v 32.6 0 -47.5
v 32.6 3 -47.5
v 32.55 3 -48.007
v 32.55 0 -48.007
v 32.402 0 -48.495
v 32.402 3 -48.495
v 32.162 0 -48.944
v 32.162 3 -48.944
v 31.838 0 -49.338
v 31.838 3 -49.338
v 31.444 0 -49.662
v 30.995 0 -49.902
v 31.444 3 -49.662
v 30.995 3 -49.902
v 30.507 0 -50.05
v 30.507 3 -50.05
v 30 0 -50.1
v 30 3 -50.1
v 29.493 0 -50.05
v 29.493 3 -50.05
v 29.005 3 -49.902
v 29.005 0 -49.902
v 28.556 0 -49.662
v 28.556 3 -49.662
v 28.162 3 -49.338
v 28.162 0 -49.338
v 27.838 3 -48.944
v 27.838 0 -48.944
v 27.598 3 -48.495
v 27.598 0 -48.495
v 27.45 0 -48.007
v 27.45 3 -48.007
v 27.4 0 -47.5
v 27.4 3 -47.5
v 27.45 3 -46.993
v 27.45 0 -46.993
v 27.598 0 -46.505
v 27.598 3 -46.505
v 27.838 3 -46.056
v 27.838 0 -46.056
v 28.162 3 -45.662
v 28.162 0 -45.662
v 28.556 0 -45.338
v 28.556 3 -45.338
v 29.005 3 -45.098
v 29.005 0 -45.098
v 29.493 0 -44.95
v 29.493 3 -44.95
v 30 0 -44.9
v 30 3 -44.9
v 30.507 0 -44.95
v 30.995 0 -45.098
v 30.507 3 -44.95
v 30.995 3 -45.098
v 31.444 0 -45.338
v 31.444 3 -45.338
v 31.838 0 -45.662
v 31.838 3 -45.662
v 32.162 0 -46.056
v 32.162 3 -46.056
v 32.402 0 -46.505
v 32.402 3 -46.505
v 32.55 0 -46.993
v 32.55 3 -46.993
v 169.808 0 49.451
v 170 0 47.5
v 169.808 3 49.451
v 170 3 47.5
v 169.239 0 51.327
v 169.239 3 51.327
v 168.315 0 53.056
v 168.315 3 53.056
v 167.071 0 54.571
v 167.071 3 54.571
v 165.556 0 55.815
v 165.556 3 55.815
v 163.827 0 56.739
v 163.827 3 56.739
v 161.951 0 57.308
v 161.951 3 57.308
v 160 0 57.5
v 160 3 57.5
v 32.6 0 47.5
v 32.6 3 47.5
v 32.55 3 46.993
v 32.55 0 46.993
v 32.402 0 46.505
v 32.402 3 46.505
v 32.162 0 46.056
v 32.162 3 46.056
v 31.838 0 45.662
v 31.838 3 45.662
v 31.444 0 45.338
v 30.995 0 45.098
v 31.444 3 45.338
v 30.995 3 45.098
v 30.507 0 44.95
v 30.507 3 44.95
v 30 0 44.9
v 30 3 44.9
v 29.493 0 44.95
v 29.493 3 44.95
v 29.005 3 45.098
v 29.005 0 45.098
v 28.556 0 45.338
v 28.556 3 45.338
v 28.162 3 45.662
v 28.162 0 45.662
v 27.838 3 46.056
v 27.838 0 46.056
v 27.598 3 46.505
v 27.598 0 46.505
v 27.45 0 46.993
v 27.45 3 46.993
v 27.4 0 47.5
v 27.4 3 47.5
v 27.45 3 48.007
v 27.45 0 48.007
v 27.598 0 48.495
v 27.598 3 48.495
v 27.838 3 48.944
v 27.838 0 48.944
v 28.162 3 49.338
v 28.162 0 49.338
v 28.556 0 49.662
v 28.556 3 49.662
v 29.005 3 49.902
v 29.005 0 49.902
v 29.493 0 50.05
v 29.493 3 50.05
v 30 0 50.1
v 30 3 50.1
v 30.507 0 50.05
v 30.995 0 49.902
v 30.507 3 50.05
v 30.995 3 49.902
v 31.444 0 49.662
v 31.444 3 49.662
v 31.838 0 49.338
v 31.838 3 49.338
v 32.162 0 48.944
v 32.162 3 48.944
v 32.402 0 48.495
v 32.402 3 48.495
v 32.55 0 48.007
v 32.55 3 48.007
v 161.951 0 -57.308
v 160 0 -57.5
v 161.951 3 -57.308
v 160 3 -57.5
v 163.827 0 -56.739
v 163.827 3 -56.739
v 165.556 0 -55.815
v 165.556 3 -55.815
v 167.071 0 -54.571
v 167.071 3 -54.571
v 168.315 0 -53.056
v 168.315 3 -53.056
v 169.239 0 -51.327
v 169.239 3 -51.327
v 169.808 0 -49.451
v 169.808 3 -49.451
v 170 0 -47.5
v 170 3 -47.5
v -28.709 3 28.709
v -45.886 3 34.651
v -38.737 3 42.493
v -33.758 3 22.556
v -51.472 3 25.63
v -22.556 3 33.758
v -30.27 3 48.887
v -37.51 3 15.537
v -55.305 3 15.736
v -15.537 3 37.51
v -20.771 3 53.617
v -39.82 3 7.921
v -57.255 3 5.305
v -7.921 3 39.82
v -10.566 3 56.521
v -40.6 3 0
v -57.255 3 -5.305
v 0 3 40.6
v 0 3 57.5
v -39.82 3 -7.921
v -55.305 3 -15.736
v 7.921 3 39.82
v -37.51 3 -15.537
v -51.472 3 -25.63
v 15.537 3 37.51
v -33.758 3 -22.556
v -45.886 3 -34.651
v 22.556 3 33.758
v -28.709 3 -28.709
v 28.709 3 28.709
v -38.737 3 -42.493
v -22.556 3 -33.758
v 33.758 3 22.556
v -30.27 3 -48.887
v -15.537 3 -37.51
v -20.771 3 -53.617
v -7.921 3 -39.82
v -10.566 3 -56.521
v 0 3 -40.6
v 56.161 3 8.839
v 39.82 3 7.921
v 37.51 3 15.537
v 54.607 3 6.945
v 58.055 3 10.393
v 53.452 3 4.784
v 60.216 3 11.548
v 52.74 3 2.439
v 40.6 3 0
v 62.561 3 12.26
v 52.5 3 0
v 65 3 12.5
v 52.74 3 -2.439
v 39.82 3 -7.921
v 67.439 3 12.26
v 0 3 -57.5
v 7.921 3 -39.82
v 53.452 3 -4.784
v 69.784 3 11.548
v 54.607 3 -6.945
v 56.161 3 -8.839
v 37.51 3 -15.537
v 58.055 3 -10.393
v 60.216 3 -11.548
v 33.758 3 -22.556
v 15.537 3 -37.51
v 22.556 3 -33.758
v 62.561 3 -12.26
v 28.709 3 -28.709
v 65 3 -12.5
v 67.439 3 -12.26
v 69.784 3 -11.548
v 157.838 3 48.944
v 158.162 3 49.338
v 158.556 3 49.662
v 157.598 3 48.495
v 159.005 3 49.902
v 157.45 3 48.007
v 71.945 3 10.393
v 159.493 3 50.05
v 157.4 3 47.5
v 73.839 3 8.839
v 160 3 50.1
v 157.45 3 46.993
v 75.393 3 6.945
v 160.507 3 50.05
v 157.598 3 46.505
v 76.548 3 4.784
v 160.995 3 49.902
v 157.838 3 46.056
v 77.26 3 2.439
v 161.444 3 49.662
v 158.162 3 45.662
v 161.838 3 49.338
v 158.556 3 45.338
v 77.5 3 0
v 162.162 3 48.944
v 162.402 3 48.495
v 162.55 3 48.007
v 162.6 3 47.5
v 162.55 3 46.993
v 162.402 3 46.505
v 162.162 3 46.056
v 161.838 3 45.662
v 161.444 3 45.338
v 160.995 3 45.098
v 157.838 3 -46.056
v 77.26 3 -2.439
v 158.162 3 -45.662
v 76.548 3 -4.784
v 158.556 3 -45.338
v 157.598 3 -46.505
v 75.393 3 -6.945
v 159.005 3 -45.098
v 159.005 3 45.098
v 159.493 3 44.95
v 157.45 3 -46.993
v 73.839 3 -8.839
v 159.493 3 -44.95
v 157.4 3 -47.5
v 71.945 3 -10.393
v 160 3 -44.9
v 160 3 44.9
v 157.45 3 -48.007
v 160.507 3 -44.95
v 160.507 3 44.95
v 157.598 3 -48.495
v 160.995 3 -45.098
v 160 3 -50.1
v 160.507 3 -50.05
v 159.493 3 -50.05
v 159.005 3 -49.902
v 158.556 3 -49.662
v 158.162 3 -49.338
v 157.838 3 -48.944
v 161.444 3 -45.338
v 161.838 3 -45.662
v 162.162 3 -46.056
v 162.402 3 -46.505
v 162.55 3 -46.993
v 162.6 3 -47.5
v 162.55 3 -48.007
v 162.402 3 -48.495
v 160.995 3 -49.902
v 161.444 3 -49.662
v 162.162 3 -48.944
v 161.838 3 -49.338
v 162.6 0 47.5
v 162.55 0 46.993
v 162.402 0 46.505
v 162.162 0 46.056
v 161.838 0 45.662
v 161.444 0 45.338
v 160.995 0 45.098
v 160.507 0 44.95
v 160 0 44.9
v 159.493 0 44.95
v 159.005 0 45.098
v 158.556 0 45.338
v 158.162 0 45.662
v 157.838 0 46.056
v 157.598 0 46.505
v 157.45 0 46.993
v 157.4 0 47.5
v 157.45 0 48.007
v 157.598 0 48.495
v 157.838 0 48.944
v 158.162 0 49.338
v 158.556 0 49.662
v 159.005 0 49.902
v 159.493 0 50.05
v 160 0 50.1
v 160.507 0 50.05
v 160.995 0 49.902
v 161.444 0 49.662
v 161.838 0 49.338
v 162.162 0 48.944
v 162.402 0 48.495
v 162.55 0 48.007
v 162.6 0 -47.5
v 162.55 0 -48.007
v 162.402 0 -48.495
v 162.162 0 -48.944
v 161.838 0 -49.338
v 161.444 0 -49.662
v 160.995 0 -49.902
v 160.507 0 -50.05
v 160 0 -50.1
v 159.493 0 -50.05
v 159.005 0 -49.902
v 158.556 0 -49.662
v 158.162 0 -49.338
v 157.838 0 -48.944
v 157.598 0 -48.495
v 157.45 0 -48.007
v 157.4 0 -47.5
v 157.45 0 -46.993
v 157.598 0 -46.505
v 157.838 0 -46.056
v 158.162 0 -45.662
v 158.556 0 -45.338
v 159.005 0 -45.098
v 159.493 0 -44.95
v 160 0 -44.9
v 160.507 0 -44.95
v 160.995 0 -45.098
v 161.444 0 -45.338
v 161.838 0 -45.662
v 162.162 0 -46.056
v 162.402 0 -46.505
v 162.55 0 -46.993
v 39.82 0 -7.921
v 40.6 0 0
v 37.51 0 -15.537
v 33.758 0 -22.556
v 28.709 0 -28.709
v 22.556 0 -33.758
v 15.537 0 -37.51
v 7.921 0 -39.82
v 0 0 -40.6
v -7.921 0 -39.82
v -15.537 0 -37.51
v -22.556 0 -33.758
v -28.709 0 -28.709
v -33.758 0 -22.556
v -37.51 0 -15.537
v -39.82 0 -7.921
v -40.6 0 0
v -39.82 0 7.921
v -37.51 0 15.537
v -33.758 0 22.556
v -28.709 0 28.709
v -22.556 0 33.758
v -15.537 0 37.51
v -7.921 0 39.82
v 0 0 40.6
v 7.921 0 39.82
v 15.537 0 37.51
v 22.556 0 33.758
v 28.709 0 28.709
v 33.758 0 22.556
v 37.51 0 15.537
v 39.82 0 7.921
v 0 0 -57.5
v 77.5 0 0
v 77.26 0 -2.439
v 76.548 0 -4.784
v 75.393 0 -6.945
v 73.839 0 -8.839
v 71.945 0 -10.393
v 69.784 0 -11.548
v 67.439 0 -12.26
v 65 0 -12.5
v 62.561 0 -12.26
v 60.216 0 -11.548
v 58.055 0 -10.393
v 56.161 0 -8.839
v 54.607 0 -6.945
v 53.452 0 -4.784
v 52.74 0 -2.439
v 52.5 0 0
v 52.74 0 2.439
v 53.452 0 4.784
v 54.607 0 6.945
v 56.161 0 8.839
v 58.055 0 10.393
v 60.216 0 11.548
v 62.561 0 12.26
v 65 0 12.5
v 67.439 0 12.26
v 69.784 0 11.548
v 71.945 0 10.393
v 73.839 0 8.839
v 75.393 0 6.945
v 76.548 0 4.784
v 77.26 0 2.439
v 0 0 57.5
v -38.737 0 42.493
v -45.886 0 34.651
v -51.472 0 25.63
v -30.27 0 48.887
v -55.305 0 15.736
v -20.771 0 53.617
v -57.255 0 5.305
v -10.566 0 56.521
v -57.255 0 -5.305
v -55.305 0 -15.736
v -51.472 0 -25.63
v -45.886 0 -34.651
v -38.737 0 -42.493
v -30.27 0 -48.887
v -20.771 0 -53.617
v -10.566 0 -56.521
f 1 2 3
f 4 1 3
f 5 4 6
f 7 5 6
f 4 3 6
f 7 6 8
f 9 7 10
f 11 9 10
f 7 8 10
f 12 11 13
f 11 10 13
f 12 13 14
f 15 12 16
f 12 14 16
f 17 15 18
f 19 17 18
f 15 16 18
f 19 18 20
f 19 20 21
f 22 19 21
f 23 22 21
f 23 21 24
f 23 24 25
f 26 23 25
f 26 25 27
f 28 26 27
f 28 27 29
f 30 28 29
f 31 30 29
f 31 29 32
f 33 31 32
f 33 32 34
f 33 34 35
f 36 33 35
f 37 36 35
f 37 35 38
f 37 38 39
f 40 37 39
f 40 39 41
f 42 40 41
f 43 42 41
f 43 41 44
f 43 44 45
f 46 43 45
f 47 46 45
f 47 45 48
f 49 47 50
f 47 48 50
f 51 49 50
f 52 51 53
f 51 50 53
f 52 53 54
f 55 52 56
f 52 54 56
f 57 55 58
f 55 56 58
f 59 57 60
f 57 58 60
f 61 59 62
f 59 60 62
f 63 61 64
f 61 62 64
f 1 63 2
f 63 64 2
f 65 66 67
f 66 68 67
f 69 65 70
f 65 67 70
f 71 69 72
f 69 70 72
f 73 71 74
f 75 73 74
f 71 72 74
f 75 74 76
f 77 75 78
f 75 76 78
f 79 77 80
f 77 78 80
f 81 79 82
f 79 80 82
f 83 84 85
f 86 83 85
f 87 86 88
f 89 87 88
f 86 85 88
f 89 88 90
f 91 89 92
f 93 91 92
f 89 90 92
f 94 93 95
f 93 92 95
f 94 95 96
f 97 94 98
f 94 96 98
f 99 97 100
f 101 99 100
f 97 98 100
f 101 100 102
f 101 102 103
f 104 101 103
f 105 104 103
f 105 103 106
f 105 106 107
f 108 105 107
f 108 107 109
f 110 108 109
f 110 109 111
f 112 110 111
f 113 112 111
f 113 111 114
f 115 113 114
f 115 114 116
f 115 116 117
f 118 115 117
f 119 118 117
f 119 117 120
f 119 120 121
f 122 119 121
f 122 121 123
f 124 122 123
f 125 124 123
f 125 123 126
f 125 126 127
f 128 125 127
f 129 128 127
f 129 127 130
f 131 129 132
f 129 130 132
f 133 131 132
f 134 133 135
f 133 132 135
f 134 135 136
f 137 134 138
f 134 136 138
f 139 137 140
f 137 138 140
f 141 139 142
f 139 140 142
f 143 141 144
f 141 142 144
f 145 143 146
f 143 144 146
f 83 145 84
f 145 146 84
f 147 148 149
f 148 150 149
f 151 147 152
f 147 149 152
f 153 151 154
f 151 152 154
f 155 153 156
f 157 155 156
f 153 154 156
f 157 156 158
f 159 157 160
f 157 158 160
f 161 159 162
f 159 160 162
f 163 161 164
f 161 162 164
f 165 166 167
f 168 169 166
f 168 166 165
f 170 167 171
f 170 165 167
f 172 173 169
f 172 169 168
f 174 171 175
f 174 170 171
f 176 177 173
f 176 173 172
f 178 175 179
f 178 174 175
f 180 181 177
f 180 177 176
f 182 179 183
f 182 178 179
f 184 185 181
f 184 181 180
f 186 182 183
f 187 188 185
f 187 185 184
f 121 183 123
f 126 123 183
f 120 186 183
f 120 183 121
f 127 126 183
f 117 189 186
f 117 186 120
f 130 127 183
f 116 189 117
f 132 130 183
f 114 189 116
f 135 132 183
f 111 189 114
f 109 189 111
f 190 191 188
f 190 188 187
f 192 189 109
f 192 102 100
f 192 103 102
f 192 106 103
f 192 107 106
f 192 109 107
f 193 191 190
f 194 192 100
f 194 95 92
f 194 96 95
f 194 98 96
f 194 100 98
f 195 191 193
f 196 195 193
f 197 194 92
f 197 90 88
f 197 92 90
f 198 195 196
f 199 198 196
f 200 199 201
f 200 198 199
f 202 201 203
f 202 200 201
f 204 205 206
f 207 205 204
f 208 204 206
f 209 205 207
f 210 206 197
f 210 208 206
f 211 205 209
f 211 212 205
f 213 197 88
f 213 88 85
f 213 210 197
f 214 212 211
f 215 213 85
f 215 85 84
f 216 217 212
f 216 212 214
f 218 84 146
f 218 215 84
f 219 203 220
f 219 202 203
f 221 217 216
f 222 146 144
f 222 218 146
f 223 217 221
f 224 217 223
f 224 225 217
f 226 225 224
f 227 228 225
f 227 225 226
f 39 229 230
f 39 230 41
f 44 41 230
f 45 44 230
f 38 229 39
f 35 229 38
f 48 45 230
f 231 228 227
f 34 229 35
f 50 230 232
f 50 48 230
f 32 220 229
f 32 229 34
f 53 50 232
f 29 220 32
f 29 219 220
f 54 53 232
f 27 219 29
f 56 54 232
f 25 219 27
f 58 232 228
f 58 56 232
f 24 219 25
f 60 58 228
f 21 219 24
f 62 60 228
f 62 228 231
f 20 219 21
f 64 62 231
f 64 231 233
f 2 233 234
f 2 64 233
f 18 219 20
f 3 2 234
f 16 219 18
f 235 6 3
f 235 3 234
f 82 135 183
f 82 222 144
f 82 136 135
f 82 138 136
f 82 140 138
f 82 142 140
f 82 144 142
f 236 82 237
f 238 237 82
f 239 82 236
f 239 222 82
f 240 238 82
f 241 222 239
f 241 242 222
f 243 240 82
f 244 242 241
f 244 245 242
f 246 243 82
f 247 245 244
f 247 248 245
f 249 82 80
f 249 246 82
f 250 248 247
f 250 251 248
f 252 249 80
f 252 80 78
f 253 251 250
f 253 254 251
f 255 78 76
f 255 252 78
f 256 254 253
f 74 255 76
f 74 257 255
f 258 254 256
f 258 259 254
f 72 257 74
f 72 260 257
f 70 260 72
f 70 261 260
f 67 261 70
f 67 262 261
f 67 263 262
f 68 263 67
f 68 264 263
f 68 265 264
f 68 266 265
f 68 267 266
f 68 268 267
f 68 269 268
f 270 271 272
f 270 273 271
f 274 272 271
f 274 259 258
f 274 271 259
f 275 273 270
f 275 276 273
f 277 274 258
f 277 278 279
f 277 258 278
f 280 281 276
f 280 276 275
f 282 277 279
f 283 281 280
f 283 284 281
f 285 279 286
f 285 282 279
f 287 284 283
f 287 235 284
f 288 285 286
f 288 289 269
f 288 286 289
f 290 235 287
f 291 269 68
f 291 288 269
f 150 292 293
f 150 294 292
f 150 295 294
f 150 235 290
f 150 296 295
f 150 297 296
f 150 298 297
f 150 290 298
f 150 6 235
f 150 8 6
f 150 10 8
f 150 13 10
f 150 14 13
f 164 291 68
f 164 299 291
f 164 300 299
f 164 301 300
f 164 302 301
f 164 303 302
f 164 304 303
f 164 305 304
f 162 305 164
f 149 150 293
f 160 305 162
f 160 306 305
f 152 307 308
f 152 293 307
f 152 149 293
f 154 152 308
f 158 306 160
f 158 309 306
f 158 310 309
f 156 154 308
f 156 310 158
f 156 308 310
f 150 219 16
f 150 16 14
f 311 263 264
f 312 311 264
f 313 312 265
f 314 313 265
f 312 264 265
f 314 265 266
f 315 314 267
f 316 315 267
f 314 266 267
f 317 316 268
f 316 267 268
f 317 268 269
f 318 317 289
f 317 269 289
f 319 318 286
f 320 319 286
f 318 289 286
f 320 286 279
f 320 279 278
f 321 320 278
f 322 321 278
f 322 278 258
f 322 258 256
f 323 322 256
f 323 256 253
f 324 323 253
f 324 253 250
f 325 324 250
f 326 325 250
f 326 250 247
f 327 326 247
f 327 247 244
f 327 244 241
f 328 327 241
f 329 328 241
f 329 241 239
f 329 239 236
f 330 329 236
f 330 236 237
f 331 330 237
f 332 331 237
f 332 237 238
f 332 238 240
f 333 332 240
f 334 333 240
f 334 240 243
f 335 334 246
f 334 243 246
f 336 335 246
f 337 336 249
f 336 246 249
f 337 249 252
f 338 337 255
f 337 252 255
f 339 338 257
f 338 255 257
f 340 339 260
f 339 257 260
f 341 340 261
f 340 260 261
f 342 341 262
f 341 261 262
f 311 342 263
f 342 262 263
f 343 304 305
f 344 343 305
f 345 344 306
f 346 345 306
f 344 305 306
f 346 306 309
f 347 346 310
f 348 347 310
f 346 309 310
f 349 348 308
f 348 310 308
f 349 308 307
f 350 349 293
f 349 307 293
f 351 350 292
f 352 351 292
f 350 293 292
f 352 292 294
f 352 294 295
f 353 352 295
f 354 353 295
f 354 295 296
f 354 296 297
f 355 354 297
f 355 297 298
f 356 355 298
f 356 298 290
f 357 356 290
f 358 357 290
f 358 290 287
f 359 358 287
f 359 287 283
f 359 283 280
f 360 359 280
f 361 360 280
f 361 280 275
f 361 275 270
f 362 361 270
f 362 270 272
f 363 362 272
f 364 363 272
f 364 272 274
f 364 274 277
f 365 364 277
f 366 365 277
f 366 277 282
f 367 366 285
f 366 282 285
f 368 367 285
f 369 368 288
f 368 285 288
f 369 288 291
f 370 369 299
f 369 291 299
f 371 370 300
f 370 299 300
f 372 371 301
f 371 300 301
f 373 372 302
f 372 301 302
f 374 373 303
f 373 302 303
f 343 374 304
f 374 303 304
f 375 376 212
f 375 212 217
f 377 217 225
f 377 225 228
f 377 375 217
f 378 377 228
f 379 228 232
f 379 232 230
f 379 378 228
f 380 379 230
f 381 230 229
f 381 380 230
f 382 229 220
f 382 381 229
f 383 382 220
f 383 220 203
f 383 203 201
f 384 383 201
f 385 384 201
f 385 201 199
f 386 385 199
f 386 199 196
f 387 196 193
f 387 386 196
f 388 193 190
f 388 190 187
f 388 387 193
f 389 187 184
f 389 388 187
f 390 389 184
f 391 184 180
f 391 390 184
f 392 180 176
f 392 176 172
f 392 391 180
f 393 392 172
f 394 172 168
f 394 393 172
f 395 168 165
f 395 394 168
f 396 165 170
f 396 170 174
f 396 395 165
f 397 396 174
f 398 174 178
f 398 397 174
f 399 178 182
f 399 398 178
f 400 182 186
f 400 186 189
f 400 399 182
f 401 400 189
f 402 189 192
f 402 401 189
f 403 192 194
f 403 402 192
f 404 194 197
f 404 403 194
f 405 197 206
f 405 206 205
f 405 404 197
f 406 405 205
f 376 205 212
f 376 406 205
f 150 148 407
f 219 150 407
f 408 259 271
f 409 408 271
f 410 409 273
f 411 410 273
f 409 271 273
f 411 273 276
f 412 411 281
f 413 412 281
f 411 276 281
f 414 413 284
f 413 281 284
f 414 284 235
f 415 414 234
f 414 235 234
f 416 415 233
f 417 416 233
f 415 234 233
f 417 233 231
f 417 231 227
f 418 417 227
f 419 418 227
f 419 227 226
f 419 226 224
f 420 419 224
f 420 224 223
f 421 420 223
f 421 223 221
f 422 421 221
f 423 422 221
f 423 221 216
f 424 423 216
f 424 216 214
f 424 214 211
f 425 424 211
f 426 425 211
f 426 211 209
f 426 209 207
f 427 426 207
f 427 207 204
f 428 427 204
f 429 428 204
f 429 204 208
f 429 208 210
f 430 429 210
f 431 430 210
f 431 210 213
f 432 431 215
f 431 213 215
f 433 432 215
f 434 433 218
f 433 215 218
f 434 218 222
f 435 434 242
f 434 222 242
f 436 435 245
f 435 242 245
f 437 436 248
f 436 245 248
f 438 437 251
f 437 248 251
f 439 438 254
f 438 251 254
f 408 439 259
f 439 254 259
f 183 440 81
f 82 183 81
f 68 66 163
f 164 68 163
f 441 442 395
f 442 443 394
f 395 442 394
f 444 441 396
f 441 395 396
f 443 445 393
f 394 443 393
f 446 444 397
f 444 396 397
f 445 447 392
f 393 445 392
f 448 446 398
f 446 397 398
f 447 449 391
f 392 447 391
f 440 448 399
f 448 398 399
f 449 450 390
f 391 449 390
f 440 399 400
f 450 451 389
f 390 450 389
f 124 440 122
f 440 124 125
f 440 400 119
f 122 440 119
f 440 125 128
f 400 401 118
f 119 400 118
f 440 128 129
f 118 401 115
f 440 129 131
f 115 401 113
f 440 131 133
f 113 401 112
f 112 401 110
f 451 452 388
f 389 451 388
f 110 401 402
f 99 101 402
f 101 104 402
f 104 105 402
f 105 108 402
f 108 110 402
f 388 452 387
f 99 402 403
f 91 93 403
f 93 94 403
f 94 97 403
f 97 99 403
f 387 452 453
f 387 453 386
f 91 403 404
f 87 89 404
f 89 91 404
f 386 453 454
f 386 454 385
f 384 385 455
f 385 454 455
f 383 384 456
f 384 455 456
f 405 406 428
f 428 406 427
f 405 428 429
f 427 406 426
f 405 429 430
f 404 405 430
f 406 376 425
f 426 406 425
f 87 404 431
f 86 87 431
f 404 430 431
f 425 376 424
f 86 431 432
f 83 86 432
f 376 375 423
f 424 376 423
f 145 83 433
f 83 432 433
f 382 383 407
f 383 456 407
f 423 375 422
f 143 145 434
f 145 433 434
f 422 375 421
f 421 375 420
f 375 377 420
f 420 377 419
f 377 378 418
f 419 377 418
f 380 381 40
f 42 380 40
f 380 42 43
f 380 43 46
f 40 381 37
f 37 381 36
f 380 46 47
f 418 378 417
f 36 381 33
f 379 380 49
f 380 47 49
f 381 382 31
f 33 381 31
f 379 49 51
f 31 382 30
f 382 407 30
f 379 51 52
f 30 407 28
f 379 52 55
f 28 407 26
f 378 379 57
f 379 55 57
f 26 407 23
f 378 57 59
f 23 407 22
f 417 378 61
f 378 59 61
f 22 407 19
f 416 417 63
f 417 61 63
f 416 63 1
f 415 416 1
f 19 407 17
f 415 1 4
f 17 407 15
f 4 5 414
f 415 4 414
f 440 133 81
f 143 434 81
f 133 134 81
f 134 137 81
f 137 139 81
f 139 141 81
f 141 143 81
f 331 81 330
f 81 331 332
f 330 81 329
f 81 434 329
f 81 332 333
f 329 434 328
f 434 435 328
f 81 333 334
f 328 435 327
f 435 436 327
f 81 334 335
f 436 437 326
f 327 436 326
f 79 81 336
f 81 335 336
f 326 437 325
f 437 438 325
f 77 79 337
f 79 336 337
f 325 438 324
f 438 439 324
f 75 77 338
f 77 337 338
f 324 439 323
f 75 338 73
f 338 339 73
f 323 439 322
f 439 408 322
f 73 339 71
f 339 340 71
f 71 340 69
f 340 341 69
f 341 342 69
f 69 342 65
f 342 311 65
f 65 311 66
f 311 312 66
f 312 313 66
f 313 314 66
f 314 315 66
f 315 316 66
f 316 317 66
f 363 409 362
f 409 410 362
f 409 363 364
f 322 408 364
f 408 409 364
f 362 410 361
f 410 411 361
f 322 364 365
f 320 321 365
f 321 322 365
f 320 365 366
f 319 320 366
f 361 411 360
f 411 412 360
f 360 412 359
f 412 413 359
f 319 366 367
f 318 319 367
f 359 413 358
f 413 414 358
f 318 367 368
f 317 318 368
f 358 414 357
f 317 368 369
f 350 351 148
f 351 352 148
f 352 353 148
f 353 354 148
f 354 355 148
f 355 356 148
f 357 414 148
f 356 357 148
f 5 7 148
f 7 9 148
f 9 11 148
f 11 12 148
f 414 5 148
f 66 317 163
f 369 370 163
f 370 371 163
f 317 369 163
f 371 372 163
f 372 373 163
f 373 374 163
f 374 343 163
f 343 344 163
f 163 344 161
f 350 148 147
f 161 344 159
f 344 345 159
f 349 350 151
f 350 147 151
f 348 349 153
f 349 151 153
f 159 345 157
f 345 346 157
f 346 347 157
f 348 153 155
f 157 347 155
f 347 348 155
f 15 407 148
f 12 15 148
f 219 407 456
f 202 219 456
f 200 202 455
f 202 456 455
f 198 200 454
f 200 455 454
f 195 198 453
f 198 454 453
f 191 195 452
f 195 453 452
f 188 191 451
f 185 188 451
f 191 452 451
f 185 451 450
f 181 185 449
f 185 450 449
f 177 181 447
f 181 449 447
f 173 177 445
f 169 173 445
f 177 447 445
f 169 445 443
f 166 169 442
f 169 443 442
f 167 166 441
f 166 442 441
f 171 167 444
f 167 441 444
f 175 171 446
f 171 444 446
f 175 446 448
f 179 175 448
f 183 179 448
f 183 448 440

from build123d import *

# Parameters (mm, degrees)
SKETCH1_R           = 57.5
SKETCH1_R_2         = 40.6
BOSS_EXTRUDE1_DEPTH = 3
FILLET1_R           = 10
SKETCH2_R           = 2.6
SKETCH2_R_2         = 12.5
CUT_EXTRUDE1_DEPTH  = 4


with BuildPart() as part:
    # Sketch1 → Boss-Extrude1 (new body)
    with BuildSketch(Plane(origin=(0, 0, 0), x_dir=(1, 0, 0), z_dir=(0, 1, 0))):
        with BuildLine():
            Line((170, 57.5), (0, 57.5))
            ThreePointArc((0, 57.5), (40.658639918, 40.658639918), (57.5, 0))
            ThreePointArc((57.5, 0), (40.658639918, -40.658639918), (0, -57.5))
            Line((0, -57.5), (170, -57.5))
            Line((170, -57.5), (170, 57.5))
        make_face()
        Circle(SKETCH1_R)
        Circle(SKETCH1_R_2, mode=Mode.SUBTRACT)
    extrude(amount=BOSS_EXTRUDE1_DEPTH)

    # Fillet1
    fillet1_edges = [part.edges().sort_by_distance(p)[0] for p in [
        (170, 1.5, -57.5),
        (170, 1.5, 57.5),
    ]]
    fillet(fillet1_edges, radius=FILLET1_R)

    # Sketch2 → Cut-Extrude1 (cut, through all)
    with BuildSketch(Plane(origin=(0, 3, 0), x_dir=(1, 0, 0), z_dir=(0, 1, 0))):
        with Locations((160, 47.5)):
            Circle(SKETCH2_R)
        with Locations((160, -47.5)):
            Circle(SKETCH2_R)
        with Locations((30, -47.5)):
            Circle(SKETCH2_R)
        with Locations((30, 47.5)):
            Circle(SKETCH2_R)
        with Locations((65, 0)):
            Circle(SKETCH2_R_2)
    extrude(amount=-CUT_EXTRUDE1_DEPTH, mode=Mode.SUBTRACT)


solid = part.part
